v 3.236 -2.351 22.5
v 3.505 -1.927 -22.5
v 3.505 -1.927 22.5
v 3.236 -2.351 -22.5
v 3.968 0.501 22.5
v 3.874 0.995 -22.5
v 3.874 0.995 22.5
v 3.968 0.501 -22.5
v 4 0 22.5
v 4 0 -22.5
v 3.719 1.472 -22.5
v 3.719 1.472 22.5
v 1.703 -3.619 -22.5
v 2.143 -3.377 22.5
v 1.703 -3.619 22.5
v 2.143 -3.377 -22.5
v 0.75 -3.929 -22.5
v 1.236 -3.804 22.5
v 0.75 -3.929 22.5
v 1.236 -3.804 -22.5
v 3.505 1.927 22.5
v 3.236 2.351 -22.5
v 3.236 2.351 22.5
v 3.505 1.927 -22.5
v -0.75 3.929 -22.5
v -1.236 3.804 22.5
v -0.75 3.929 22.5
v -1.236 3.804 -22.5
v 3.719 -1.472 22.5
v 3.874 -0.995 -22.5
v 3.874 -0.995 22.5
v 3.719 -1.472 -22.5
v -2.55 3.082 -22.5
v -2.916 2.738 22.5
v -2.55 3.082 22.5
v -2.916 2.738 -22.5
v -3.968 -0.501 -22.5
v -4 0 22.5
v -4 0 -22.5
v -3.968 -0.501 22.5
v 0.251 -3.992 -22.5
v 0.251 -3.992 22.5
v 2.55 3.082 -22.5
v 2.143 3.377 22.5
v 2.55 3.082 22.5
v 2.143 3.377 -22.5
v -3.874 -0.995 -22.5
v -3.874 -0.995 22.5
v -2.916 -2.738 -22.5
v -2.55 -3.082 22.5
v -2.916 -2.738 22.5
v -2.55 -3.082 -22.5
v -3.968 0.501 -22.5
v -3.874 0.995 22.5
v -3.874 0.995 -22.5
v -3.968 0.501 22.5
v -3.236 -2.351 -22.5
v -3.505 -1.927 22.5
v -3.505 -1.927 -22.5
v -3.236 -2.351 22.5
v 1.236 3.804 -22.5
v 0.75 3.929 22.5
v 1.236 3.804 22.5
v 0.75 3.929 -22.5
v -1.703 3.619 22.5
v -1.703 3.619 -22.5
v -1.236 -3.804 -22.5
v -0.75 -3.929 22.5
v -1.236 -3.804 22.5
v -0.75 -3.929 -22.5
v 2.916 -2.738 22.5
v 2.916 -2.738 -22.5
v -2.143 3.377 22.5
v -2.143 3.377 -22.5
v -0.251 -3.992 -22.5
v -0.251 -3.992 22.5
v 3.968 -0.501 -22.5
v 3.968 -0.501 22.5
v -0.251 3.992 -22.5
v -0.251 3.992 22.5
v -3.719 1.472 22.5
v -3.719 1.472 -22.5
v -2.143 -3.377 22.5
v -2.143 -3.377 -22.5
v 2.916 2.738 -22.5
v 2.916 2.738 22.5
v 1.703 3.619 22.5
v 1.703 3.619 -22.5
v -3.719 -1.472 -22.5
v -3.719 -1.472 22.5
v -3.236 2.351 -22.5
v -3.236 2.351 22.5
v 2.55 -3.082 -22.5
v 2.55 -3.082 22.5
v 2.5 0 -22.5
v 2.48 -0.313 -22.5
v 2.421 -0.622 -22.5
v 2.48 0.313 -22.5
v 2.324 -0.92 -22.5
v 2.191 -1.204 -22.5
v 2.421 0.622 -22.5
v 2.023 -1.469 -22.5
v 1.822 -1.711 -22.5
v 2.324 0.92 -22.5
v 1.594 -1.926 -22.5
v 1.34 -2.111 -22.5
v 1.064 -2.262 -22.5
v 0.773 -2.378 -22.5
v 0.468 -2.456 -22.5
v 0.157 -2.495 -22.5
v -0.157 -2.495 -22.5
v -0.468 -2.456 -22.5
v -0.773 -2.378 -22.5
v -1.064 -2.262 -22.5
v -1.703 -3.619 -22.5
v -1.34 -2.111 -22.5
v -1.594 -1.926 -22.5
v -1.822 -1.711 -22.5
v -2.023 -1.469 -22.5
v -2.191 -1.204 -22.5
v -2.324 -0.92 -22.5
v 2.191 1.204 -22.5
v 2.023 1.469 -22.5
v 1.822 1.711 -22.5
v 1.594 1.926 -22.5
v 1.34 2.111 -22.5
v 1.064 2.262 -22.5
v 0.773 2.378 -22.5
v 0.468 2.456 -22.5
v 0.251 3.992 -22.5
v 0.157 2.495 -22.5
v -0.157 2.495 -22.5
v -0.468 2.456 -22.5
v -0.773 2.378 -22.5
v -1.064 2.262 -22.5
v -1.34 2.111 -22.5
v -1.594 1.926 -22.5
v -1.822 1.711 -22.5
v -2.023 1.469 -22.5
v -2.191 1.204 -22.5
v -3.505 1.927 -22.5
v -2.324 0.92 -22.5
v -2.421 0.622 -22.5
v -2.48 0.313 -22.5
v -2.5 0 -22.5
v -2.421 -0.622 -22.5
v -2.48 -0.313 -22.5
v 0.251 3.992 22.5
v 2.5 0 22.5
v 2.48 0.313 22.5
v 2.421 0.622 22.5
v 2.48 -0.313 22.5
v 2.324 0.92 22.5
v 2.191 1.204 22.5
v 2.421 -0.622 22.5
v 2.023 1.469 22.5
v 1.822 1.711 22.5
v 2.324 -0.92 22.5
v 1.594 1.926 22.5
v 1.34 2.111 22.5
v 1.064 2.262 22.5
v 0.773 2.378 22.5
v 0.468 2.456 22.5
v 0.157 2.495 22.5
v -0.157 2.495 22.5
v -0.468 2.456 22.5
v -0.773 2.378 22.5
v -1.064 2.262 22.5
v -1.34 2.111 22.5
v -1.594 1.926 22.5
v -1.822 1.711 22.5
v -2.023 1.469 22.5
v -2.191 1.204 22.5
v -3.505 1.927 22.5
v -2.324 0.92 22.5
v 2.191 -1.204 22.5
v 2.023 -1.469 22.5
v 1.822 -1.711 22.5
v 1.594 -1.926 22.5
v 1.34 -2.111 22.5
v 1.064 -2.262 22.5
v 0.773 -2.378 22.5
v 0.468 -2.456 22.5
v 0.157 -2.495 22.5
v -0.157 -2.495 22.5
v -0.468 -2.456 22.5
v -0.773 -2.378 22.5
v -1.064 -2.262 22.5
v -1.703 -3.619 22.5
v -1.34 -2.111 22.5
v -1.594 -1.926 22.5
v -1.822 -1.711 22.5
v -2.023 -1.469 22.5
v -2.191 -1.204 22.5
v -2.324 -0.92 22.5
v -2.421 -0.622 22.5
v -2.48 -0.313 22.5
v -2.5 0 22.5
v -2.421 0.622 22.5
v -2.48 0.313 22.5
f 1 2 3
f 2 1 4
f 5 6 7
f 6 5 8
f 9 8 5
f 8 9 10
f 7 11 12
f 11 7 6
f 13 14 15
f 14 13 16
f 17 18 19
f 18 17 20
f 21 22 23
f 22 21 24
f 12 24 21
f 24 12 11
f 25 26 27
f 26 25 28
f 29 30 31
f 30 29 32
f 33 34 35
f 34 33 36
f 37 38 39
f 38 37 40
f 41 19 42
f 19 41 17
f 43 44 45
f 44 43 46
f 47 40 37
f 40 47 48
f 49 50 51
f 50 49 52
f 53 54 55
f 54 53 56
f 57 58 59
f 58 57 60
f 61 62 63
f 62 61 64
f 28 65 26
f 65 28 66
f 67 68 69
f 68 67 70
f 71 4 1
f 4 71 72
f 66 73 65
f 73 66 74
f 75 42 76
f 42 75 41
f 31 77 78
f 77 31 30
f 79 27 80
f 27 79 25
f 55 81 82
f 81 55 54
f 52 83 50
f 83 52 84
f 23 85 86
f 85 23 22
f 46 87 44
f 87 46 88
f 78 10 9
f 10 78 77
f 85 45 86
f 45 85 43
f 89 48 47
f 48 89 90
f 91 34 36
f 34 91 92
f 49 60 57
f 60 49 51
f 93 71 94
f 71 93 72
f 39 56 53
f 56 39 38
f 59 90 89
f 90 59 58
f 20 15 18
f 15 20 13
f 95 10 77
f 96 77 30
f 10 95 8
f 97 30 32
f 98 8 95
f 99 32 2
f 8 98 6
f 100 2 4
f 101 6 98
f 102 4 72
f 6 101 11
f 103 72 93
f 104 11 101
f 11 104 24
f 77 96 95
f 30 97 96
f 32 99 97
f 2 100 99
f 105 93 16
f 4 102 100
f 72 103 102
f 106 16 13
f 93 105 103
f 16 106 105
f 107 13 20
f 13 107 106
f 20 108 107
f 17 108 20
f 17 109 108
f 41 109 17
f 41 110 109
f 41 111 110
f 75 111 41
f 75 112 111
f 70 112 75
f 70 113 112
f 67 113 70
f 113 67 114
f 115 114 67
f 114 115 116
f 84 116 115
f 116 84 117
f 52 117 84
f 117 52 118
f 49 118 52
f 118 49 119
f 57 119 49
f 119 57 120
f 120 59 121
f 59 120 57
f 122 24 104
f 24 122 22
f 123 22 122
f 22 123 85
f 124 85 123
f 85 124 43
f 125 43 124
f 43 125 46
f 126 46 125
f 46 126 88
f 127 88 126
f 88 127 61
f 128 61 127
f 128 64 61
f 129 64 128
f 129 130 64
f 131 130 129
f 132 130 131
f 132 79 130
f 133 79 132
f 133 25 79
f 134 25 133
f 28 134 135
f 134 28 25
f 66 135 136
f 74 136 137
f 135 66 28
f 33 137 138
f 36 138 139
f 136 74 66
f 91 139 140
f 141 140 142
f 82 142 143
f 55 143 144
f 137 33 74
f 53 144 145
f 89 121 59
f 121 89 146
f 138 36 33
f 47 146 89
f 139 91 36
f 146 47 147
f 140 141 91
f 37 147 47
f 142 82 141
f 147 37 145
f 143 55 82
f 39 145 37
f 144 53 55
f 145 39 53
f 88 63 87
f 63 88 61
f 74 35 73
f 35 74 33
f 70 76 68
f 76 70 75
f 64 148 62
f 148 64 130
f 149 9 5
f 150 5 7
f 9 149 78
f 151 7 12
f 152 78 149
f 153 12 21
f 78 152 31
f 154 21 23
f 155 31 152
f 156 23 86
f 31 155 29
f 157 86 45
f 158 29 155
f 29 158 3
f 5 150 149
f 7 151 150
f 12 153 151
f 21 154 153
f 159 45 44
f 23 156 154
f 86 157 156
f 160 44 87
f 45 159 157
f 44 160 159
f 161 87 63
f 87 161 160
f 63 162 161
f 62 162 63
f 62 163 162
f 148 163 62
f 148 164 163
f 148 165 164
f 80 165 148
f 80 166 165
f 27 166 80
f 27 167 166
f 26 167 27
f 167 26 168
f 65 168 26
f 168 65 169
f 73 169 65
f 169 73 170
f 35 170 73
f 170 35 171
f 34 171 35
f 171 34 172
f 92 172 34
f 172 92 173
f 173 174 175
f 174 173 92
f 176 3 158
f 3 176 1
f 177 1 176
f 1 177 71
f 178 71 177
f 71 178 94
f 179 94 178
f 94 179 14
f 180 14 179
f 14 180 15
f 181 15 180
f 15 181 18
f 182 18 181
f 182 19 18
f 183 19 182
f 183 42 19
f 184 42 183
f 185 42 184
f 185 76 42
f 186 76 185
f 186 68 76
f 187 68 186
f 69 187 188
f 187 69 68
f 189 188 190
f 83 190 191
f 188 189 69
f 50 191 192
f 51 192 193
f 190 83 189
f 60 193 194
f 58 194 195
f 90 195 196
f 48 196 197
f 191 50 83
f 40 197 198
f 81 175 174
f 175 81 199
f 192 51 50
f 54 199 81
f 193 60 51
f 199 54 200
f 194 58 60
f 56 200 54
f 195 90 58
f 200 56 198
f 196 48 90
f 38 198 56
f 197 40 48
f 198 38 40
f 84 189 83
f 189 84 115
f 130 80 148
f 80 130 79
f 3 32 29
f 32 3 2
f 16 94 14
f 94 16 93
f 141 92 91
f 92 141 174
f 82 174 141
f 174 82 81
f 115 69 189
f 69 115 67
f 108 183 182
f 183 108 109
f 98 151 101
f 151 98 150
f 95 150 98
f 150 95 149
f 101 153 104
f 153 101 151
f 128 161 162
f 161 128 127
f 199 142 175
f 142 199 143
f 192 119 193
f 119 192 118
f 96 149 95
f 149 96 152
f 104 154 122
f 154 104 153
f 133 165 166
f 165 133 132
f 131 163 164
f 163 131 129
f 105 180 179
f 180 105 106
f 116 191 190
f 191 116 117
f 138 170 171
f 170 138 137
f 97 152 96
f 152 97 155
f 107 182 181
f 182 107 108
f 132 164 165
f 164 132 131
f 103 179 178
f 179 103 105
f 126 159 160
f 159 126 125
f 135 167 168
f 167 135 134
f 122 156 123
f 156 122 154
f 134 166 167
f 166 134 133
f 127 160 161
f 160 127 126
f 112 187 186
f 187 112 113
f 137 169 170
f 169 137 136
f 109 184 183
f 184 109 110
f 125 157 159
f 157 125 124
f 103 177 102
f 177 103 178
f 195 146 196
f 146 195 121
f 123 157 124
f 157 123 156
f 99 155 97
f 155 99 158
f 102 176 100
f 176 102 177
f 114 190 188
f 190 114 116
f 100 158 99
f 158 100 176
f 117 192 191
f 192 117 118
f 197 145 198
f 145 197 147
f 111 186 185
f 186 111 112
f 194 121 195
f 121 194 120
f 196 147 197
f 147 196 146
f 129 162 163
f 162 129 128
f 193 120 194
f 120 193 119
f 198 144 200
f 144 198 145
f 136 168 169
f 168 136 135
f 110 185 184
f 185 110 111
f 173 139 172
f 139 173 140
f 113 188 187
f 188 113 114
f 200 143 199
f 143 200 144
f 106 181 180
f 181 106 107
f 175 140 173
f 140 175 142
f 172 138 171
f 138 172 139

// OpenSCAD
$fn = 50;


difference() {
	union() {
		translate(v = [0, 0, -22.5000000000]) {
			cylinder(h = 45, r = 4.0000000000);
		}
	}
	union() {
		translate(v = [0, 0, -100.0000000000]) {
			cylinder(h = 200, r = 2.5000000000);
		}
	}
}
